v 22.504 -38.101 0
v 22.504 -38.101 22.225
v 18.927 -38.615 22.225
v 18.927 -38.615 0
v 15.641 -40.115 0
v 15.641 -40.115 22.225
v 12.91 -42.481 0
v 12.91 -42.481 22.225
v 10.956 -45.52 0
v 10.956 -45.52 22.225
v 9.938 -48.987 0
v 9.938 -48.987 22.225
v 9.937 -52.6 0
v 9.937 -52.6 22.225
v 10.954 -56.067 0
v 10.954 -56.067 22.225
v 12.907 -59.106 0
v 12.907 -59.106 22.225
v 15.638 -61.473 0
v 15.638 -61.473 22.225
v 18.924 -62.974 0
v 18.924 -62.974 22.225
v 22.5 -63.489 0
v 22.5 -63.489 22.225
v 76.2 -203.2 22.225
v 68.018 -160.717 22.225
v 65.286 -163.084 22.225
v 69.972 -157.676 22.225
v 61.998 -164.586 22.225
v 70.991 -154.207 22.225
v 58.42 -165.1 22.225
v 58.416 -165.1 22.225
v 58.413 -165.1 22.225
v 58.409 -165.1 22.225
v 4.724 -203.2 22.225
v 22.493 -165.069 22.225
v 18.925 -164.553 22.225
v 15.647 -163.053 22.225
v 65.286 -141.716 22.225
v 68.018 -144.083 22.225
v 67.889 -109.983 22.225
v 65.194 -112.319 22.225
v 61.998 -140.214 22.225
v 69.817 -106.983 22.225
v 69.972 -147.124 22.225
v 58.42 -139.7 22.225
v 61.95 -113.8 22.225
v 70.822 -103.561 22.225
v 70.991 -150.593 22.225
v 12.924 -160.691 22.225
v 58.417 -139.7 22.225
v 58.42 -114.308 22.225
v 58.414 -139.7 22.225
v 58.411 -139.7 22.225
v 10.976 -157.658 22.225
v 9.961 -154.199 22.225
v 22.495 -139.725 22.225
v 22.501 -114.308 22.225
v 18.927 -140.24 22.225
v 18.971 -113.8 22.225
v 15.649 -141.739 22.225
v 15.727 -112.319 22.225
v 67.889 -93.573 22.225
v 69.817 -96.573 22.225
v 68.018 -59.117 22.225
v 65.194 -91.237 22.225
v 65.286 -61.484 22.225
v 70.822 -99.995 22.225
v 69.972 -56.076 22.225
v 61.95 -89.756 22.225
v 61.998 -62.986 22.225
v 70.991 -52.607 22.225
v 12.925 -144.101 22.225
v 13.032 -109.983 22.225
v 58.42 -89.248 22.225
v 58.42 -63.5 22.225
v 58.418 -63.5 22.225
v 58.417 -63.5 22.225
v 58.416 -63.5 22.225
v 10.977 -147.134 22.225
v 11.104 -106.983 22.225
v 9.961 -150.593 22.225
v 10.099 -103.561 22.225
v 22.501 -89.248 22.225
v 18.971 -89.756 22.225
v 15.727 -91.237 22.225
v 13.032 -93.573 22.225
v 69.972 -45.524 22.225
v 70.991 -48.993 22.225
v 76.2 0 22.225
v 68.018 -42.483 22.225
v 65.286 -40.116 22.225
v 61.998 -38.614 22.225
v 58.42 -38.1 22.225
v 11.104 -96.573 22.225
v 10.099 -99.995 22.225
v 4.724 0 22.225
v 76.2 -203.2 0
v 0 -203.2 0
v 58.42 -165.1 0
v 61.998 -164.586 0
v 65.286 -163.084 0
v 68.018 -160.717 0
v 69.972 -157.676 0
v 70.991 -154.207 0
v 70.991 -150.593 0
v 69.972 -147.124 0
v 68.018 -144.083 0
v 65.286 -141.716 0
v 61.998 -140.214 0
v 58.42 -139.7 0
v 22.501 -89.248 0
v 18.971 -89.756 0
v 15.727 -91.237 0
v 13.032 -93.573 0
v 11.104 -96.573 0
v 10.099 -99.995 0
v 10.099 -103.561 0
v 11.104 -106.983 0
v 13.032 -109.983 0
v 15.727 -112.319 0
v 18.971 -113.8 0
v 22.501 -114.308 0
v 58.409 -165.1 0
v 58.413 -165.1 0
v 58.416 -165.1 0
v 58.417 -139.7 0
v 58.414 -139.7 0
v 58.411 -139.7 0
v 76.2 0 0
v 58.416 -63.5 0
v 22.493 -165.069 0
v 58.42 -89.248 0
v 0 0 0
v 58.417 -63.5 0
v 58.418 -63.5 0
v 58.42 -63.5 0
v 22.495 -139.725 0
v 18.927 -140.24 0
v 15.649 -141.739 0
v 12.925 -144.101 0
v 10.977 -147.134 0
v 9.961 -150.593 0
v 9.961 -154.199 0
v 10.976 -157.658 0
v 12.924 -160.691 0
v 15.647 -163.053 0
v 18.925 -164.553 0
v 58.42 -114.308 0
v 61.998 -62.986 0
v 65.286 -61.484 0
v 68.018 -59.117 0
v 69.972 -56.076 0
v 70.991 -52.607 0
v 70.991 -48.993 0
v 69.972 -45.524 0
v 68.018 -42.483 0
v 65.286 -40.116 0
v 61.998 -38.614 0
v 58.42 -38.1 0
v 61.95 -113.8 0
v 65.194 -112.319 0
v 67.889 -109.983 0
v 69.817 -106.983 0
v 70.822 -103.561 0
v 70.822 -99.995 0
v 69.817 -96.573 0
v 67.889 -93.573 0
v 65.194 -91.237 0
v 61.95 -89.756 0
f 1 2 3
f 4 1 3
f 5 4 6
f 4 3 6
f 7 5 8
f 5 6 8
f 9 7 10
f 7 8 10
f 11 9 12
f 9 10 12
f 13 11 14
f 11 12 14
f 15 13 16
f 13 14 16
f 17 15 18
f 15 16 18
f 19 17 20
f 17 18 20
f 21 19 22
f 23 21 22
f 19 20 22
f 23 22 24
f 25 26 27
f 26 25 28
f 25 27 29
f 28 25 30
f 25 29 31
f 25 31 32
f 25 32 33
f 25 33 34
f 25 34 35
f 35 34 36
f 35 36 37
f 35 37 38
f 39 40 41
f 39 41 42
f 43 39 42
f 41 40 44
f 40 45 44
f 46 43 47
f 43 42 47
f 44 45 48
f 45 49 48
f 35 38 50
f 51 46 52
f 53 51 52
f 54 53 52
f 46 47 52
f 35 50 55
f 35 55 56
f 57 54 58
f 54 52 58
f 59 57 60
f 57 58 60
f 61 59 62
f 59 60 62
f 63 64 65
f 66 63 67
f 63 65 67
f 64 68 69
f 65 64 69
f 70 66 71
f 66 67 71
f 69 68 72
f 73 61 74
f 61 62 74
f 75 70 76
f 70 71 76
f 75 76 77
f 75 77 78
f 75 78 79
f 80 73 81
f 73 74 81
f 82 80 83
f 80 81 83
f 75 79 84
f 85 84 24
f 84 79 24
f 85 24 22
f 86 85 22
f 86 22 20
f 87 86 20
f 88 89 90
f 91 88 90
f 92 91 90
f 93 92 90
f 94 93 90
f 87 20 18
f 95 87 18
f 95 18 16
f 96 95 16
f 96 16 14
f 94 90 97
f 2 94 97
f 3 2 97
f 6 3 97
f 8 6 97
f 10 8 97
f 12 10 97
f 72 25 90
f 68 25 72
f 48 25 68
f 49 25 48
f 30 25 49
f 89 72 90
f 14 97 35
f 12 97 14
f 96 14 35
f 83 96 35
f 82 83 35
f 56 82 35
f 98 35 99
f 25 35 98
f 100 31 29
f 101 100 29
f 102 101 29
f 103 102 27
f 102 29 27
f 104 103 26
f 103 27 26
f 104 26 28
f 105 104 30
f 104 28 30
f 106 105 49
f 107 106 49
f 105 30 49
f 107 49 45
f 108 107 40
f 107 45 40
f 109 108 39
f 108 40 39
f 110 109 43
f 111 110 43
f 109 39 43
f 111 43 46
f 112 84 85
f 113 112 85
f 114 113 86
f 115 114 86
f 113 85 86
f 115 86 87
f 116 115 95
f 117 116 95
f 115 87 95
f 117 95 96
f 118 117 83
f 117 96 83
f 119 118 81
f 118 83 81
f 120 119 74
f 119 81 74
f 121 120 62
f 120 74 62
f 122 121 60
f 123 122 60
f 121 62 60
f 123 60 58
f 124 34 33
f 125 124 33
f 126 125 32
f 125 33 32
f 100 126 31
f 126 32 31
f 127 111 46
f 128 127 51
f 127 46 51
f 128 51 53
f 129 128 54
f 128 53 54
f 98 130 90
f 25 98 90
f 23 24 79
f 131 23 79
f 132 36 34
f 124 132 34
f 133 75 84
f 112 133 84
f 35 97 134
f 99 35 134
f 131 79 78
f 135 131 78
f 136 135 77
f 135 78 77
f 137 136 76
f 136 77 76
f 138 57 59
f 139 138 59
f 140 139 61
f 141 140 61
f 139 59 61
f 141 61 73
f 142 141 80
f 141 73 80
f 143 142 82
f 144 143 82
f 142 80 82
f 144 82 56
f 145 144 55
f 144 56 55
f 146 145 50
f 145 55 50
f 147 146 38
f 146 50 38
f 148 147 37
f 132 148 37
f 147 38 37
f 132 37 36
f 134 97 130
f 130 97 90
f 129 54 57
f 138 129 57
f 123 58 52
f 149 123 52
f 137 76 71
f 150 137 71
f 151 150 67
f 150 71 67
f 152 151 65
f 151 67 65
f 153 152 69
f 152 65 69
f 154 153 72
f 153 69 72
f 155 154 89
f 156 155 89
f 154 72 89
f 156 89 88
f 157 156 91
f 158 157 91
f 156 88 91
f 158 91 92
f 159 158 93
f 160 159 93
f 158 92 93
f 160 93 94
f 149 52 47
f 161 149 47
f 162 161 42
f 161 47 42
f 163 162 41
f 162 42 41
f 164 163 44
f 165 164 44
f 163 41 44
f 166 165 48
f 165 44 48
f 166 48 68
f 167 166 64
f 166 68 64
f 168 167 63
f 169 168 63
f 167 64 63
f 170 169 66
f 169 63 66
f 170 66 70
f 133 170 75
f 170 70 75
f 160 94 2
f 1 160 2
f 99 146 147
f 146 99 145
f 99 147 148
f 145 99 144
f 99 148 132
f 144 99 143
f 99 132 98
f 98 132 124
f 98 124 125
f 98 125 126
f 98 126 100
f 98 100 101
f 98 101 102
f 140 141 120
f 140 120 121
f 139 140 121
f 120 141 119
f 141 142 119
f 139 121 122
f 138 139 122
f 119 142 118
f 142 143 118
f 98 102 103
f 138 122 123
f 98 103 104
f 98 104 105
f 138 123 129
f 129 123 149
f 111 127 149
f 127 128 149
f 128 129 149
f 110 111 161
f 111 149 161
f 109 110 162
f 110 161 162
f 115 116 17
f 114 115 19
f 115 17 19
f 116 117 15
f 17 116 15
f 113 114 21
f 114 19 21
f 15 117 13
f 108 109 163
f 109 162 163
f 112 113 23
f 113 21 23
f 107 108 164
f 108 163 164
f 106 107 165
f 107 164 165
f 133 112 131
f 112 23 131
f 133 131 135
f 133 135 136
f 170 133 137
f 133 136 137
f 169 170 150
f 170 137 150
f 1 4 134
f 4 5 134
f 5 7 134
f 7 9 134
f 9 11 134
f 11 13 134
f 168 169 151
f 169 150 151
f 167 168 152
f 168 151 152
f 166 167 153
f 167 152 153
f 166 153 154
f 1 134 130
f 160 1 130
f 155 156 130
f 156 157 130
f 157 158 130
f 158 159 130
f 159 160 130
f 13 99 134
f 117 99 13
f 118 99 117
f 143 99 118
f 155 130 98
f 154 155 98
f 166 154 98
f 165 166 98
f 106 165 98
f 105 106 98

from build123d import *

# Parameters (mm, degrees)
F1_DEPTH = 203.2
F2_DEPTH = 203.2
F4_DEPTH = 25.4


with BuildPart() as f1:
    # F0 (on Front) → F1 (new body)
    with BuildSketch(Plane.XZ):
        Polygon((4.7240695831, 22.225), (0, 0), (76.2, 0), (76.2, 22.225), align=None)
    extrude(amount=F1_DEPTH)

    # F0 (on Front) → F2 (join)
    with BuildSketch(Plane.XZ):
        Polygon((4.7240695831, 22.225), (0, 0), (76.2, 0), (76.2, 22.225), align=None)
    extrude(amount=F2_DEPTH)

    # F3 (on face) → F4 (cut)
    with BuildSketch(Plane.XY.offset(22.225)):
        with BuildLine():
            ThreePointArc((22.500173924, -63.4888712894), (9.8102666247, -50.7932735364), (22.5036881615, -38.1011894183))
            ThreePointArc((22.5036881615, -38.1011894183), (9.8080901072, -50.7932732351), (22.500173924, -63.4888712894))
        make_face()
        with BuildLine():
            Line((58.4195802106, -38.1000022454), (22.5036881615, -38.1011894183))
            ThreePointArc((22.5036881615, -38.1011894183), (9.8102666247, -50.7932735364), (22.500173924, -63.4888712894))
            Line((22.500173924, -63.4888712894), (58.416064268, -63.5000016286))
            ThreePointArc((58.416064268, -63.5000016286), (58.4178222393, -63.5000020517), (58.4195802106, -63.5000022315))
            ThreePointArc((58.4195802106, -63.5000022315), (71.1199999996, -50.8000022384), (58.4195802106, -38.1000022454))
        make_face()
        with BuildLine():
            Line((58.4195802106, -89.2484490539), (22.501472381, -89.2484490539))
            ThreePointArc((22.501472381, -89.2484490539), (9.9718902315, -101.7780312034), (22.501472381, -114.3076133529))
            Line((22.501472381, -114.3076133529), (58.4195802106, -114.3076133529))
            ThreePointArc((58.4195802106, -114.3076133529), (70.9491623601, -101.7780312034), (58.4195802106, -89.2484490539))
        make_face()
        with BuildLine():
            Line((58.4111609952, -139.7000054607), (22.4953197832, -139.7250023393))
            ThreePointArc((22.4953197832, -139.7250023393), (9.8321170384, -152.3959699434), (22.4932164886, -165.0690392045))
            Line((22.4932164886, -165.0690392045), (58.4090530569, -165.0999973742))
            ThreePointArc((58.4090530569, -165.0999973742), (58.4143166333, -165.1000008204), (58.4195802107, -165.1000020852))
            ThreePointArc((58.4195802107, -165.1000020852), (71.1199998532, -152.4000022384), (58.4195802107, -139.7000023917))
            ThreePointArc((58.4195802107, -139.7000023917), (58.4153706027, -139.7000032285), (58.4111609952, -139.7000054607))
        make_face()
    extrude(amount=-F4_DEPTH, mode=Mode.SUBTRACT)


solid = f1.part
